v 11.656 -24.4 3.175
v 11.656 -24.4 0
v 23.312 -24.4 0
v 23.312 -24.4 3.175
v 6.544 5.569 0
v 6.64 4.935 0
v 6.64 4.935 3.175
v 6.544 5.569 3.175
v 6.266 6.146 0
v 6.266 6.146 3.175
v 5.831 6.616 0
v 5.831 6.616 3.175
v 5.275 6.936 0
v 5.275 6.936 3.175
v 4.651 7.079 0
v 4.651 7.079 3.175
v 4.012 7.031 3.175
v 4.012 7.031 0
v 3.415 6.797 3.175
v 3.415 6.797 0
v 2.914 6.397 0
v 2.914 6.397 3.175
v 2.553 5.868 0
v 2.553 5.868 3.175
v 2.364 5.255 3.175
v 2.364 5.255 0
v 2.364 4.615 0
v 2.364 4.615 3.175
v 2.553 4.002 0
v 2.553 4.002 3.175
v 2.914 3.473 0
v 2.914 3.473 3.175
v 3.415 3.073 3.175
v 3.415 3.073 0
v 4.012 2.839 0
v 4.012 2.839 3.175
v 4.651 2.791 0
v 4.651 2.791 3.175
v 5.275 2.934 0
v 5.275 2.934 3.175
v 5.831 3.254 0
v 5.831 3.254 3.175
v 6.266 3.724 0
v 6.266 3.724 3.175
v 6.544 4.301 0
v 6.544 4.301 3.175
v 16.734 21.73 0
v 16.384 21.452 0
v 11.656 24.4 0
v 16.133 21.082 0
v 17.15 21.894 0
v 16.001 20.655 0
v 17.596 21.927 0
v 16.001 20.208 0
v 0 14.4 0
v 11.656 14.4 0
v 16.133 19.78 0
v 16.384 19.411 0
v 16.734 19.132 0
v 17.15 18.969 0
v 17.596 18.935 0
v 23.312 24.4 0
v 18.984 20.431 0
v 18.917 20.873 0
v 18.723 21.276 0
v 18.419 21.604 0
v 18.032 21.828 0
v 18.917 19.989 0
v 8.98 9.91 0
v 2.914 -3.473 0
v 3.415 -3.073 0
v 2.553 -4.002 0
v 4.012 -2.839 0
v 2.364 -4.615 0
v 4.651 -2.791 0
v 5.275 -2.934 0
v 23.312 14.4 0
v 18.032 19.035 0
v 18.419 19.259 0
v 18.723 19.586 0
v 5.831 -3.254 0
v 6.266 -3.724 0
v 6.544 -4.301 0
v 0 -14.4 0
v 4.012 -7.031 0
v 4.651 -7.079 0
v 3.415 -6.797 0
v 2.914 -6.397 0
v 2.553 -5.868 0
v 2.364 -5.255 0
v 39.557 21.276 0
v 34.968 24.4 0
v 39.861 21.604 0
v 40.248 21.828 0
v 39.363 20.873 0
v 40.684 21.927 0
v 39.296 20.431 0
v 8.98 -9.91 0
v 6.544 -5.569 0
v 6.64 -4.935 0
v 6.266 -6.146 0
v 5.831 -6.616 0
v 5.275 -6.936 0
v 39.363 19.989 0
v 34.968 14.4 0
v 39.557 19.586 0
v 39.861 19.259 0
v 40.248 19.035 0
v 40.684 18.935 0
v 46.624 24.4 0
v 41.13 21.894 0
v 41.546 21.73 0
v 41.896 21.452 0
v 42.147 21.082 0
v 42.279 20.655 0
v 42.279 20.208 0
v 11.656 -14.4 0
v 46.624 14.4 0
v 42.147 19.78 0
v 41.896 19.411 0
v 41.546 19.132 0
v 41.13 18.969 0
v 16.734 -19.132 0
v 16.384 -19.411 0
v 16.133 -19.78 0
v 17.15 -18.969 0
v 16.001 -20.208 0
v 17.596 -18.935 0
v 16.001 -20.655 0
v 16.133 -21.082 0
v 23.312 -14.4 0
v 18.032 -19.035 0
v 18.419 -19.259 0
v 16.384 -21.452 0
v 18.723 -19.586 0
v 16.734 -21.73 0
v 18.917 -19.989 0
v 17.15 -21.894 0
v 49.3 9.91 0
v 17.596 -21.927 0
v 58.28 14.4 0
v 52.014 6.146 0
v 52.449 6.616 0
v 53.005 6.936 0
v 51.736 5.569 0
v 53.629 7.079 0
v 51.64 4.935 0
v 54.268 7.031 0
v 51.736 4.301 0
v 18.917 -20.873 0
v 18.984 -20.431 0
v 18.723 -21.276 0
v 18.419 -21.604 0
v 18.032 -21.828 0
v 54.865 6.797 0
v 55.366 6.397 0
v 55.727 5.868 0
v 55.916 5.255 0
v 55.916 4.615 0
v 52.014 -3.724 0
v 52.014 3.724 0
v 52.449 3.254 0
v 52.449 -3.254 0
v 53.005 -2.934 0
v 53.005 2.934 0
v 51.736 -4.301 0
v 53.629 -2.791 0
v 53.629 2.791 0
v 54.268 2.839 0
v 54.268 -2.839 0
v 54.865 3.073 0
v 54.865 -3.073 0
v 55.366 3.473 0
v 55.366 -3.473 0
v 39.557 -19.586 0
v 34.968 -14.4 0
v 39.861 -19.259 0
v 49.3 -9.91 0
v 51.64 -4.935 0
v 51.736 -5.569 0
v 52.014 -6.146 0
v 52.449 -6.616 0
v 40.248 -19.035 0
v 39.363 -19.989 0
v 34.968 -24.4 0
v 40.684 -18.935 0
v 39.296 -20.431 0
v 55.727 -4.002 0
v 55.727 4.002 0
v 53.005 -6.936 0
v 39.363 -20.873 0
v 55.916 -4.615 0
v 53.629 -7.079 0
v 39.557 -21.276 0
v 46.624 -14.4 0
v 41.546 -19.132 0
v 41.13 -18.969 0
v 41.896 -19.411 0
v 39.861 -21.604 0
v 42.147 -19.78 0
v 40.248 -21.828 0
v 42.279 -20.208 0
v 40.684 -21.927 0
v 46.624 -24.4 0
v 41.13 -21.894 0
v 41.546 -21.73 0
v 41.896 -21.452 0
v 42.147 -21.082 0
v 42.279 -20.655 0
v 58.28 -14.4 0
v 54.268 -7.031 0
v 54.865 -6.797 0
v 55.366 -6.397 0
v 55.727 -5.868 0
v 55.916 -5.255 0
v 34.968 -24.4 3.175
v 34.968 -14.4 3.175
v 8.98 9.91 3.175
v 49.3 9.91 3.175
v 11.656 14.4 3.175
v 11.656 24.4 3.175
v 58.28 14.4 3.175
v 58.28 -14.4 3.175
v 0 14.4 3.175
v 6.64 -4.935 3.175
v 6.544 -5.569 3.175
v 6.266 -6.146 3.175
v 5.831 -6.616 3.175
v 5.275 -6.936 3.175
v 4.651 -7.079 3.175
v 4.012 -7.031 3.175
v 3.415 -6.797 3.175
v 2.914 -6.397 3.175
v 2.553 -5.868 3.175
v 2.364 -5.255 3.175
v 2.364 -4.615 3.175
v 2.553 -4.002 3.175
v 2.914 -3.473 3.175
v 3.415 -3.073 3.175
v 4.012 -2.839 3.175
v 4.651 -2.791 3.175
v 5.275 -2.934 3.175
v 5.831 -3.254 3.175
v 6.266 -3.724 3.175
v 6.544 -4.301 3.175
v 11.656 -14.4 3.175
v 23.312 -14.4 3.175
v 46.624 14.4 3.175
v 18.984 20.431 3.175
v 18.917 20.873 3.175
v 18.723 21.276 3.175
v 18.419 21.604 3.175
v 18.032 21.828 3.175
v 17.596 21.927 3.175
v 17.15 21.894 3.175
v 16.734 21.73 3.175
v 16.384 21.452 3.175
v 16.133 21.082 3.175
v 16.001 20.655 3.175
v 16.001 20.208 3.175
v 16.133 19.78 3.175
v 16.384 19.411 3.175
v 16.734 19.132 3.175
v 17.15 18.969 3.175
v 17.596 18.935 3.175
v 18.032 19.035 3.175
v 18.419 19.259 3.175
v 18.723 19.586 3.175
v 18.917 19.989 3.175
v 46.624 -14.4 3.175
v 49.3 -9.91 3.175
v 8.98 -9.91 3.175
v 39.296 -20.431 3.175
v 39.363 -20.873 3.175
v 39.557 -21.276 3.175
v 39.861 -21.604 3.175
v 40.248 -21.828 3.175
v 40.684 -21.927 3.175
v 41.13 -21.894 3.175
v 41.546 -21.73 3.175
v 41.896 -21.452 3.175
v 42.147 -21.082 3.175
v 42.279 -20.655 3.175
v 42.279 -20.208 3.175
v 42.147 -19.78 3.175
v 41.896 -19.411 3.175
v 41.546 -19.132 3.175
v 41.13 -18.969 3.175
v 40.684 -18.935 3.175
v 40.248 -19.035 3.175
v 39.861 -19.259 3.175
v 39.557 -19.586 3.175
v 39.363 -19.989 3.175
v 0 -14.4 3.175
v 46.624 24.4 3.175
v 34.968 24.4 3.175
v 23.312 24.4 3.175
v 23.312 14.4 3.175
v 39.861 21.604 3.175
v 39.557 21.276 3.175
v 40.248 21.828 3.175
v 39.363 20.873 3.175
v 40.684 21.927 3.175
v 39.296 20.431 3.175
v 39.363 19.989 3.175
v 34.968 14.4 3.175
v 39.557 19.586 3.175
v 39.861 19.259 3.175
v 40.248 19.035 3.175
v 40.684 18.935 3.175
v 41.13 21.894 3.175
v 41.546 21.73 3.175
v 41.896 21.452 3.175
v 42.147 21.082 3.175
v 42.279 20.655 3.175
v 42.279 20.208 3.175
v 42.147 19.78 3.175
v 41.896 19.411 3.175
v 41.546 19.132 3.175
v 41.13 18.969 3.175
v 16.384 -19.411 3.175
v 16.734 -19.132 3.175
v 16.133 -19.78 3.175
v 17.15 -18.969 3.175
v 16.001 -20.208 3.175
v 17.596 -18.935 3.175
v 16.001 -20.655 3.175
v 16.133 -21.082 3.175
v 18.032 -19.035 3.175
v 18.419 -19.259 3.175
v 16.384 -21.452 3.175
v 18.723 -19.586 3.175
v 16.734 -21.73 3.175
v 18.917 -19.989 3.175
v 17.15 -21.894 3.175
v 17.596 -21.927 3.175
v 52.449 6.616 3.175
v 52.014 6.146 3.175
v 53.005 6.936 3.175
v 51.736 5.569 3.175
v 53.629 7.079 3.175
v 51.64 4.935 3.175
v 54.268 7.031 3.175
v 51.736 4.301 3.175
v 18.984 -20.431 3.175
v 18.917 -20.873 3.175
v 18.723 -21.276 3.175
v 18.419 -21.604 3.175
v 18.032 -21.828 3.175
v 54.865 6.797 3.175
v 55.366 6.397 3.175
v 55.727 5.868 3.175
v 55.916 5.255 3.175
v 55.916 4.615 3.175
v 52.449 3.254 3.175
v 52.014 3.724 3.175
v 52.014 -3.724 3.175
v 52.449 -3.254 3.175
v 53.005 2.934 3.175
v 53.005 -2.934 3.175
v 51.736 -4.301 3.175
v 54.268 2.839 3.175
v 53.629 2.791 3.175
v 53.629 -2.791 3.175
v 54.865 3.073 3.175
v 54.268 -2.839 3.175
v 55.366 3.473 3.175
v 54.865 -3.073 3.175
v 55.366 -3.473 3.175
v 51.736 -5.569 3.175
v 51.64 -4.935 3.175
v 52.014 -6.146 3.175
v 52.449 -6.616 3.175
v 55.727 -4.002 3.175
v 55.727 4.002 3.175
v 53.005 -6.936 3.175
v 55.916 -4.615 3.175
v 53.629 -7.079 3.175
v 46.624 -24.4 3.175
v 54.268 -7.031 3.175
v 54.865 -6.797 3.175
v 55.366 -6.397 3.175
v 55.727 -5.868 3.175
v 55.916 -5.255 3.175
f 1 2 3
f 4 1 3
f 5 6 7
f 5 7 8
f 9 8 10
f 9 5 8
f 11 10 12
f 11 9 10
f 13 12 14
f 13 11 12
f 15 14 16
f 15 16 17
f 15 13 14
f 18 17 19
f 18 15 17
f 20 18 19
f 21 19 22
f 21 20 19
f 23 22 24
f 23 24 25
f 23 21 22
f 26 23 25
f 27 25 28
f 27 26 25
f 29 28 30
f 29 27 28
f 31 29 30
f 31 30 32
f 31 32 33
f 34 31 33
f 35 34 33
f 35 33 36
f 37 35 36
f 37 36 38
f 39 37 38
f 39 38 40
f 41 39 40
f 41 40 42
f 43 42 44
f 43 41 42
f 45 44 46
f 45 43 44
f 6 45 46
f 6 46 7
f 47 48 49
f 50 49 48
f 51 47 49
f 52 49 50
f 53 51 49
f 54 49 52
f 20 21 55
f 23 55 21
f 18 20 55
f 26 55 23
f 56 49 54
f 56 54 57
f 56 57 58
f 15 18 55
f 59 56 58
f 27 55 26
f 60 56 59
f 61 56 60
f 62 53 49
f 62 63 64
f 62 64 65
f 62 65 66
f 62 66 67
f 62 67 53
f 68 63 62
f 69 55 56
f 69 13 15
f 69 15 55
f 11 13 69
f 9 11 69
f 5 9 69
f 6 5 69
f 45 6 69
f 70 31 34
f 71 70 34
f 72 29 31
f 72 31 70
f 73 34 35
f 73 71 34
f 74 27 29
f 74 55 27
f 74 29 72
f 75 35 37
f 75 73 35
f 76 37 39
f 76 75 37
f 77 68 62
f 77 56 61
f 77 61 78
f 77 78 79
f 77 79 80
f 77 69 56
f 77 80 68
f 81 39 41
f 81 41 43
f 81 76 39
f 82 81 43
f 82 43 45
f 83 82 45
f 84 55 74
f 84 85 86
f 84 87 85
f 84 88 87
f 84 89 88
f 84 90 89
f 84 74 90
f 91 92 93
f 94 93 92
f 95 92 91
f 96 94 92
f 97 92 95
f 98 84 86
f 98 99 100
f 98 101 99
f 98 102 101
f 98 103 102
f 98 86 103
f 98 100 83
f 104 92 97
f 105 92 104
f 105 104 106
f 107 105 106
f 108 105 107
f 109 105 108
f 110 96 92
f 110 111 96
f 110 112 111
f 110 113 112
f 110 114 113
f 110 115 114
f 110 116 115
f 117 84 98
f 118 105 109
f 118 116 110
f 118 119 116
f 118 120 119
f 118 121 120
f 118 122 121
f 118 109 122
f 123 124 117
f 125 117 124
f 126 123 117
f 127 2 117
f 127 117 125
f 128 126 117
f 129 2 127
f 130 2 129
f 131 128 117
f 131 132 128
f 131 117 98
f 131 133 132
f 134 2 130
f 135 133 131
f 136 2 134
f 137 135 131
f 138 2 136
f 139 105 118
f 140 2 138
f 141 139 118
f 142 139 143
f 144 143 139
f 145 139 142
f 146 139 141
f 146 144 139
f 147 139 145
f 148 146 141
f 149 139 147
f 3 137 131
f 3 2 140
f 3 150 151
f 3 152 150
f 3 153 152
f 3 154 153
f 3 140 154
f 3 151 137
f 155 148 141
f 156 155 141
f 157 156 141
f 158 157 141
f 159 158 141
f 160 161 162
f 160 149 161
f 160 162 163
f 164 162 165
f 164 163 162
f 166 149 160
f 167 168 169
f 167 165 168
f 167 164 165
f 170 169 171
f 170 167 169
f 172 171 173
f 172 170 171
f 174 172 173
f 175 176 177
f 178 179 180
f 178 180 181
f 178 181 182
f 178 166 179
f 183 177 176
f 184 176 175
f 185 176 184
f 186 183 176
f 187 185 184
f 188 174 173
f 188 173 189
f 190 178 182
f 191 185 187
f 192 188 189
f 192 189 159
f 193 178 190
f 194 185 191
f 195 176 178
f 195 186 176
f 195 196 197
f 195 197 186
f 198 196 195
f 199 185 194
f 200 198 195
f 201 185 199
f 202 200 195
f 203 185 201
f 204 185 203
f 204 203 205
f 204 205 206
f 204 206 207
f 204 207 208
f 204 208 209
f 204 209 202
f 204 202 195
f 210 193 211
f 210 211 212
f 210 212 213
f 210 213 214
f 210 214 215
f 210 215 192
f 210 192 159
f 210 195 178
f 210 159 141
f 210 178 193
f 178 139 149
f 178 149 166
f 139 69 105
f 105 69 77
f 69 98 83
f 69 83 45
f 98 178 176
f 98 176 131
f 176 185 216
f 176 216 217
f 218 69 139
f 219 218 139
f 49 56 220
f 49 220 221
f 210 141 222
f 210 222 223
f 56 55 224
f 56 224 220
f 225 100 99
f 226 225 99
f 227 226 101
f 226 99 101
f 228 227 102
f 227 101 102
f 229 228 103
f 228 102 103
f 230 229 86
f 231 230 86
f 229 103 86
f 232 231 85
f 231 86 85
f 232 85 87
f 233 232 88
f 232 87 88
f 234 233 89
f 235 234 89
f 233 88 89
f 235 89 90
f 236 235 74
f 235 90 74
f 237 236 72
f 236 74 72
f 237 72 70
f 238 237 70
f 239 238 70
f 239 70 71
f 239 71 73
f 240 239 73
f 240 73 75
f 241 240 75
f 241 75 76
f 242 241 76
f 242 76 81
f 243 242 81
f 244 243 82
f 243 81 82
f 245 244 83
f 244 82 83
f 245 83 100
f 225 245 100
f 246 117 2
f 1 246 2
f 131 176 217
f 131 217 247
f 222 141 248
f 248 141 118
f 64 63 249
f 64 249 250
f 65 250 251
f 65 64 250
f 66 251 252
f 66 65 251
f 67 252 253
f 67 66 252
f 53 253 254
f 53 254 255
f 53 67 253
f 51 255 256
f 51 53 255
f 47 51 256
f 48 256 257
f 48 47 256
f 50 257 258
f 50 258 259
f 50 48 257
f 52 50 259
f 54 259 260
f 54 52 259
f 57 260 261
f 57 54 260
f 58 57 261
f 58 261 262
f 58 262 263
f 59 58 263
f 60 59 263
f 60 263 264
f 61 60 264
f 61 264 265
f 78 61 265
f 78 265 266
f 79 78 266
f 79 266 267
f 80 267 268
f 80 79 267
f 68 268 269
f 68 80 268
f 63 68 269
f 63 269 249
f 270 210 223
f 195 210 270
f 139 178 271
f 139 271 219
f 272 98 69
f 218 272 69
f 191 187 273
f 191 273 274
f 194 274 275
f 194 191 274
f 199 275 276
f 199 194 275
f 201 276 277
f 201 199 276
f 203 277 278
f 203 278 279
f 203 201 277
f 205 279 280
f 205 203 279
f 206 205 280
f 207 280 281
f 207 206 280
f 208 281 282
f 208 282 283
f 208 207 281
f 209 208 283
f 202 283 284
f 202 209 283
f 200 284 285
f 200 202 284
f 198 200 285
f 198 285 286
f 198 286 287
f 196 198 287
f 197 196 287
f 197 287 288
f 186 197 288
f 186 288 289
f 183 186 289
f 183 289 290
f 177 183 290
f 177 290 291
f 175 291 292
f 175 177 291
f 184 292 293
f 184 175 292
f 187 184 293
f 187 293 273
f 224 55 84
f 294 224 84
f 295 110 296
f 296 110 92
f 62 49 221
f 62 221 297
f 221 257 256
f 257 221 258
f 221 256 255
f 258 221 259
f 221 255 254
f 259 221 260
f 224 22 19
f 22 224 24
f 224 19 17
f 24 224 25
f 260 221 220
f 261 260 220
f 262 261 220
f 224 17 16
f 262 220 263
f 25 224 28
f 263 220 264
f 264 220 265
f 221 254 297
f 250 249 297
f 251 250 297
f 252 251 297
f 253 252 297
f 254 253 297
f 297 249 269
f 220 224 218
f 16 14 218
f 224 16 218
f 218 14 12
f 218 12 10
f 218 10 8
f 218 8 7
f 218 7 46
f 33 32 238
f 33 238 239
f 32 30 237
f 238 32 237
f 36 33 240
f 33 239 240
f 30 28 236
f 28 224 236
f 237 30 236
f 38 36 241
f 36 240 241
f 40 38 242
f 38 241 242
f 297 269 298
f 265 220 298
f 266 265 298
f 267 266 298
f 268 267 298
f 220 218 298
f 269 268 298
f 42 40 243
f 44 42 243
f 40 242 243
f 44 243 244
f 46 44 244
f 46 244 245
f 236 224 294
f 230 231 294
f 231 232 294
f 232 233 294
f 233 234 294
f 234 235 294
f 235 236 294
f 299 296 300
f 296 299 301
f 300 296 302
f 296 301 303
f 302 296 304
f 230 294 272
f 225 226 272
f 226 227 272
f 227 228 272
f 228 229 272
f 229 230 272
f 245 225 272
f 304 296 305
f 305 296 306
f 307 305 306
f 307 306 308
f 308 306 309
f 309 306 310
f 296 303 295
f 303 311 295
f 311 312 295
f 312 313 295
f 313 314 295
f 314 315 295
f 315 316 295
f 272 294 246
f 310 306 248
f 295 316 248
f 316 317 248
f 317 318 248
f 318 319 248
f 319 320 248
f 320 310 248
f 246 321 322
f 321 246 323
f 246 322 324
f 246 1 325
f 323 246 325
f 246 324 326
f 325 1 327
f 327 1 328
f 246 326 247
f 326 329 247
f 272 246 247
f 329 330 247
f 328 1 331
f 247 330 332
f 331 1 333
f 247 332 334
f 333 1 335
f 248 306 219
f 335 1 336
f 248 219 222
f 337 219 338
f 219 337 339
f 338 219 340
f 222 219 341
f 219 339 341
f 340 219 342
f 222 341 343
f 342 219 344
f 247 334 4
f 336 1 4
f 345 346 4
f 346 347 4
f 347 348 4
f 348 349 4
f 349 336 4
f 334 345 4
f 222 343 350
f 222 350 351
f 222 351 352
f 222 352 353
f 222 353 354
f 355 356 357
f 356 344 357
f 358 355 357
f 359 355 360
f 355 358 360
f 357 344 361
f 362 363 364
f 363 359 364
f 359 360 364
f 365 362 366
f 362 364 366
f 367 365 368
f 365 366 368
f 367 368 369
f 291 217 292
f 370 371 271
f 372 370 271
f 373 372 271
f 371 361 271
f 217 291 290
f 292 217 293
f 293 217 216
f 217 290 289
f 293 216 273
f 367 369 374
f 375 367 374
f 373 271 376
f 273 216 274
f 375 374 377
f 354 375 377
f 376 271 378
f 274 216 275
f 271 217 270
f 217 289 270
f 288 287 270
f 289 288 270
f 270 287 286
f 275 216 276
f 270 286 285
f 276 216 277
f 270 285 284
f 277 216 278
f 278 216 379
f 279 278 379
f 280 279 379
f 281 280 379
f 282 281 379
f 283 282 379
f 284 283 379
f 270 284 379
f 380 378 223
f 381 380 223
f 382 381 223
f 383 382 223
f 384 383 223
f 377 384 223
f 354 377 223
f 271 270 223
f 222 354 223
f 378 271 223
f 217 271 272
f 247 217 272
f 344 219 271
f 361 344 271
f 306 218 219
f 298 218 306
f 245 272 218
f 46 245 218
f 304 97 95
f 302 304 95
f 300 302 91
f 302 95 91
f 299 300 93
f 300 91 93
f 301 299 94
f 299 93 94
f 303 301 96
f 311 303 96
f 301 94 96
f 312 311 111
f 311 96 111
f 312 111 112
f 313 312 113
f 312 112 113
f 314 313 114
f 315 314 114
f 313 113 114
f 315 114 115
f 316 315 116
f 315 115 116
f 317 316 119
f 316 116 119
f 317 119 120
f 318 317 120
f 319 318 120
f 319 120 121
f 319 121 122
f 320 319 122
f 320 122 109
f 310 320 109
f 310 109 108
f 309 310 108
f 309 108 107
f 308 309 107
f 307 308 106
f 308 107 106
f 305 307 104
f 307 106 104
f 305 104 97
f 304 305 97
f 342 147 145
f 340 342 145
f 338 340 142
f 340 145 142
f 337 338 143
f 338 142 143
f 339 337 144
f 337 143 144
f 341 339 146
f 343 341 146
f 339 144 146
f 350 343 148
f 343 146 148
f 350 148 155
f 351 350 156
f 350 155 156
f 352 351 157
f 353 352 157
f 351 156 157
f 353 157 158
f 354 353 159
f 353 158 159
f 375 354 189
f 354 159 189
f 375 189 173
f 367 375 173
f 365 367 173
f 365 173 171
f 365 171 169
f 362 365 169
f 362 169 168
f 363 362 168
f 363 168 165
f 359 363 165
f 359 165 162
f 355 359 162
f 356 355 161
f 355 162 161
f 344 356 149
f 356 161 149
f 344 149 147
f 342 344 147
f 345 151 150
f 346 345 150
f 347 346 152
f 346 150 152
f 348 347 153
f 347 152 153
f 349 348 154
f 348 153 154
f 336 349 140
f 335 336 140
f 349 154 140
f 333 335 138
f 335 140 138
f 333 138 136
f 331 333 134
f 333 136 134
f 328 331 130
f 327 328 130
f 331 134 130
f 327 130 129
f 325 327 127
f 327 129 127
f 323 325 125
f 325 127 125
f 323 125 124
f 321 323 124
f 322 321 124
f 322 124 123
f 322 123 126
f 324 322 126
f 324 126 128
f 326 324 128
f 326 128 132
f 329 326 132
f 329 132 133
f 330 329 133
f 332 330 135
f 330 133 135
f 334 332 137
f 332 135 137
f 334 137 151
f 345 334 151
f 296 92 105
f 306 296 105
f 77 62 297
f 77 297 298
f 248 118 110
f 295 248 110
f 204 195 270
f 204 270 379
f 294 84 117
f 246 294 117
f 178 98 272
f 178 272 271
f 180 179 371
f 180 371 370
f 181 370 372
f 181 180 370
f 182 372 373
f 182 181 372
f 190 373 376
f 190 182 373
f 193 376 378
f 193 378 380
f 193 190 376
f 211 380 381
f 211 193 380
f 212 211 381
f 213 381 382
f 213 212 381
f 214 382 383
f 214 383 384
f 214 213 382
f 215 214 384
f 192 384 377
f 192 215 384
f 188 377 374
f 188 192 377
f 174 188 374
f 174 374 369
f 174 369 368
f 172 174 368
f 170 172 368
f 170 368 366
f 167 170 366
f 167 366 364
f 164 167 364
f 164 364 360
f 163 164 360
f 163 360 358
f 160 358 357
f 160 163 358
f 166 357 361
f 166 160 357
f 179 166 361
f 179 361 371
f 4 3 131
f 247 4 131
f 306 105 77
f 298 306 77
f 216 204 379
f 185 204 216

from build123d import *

# Parameters (mm, degrees)
SKETCH2_R           = 2.15
SKETCH2_R_2         = 1.5
BOSS_EXTRUDE1_DEPTH = 3.175


with BuildPart() as part:
    # Sketch2 → Boss-Extrude1 (new body)
    with BuildSketch(Plane.XY):
        Polygon((23.312, 14.4), (29.14, 14.4), (29.14, 9.91), (8.98, 9.91), (8.98, 0), (0, 0), (0, 14.4), (11.656, 14.4), (11.656, 24.4), (23.312, 24.4), align=None)
        with Locations((4.49, 4.935)):
            Circle(SKETCH2_R, mode=Mode.SUBTRACT)
        with Locations((17.484, 20.43125)):
            Circle(SKETCH2_R_2, mode=Mode.SUBTRACT)
    boss_extrude1 = extrude(amount=BOSS_EXTRUDE1_DEPTH)

    # Mirror8: Boss-Extrude1 across plane
    add(boss_extrude1.mirror(Plane(origin=(8.98, 0, 3.175), x_dir=(0, 0, 1), z_dir=(0, 1, 0))))

    # Mirror10: part across plane


with BuildPart() as part_1:
    add(part.part)
    add(part.part.mirror(Plane(origin=(29.14, 9.91, 3.175), x_dir=(0, 0, 1), z_dir=(-1, 0, 0))))


solid = part_1.part
